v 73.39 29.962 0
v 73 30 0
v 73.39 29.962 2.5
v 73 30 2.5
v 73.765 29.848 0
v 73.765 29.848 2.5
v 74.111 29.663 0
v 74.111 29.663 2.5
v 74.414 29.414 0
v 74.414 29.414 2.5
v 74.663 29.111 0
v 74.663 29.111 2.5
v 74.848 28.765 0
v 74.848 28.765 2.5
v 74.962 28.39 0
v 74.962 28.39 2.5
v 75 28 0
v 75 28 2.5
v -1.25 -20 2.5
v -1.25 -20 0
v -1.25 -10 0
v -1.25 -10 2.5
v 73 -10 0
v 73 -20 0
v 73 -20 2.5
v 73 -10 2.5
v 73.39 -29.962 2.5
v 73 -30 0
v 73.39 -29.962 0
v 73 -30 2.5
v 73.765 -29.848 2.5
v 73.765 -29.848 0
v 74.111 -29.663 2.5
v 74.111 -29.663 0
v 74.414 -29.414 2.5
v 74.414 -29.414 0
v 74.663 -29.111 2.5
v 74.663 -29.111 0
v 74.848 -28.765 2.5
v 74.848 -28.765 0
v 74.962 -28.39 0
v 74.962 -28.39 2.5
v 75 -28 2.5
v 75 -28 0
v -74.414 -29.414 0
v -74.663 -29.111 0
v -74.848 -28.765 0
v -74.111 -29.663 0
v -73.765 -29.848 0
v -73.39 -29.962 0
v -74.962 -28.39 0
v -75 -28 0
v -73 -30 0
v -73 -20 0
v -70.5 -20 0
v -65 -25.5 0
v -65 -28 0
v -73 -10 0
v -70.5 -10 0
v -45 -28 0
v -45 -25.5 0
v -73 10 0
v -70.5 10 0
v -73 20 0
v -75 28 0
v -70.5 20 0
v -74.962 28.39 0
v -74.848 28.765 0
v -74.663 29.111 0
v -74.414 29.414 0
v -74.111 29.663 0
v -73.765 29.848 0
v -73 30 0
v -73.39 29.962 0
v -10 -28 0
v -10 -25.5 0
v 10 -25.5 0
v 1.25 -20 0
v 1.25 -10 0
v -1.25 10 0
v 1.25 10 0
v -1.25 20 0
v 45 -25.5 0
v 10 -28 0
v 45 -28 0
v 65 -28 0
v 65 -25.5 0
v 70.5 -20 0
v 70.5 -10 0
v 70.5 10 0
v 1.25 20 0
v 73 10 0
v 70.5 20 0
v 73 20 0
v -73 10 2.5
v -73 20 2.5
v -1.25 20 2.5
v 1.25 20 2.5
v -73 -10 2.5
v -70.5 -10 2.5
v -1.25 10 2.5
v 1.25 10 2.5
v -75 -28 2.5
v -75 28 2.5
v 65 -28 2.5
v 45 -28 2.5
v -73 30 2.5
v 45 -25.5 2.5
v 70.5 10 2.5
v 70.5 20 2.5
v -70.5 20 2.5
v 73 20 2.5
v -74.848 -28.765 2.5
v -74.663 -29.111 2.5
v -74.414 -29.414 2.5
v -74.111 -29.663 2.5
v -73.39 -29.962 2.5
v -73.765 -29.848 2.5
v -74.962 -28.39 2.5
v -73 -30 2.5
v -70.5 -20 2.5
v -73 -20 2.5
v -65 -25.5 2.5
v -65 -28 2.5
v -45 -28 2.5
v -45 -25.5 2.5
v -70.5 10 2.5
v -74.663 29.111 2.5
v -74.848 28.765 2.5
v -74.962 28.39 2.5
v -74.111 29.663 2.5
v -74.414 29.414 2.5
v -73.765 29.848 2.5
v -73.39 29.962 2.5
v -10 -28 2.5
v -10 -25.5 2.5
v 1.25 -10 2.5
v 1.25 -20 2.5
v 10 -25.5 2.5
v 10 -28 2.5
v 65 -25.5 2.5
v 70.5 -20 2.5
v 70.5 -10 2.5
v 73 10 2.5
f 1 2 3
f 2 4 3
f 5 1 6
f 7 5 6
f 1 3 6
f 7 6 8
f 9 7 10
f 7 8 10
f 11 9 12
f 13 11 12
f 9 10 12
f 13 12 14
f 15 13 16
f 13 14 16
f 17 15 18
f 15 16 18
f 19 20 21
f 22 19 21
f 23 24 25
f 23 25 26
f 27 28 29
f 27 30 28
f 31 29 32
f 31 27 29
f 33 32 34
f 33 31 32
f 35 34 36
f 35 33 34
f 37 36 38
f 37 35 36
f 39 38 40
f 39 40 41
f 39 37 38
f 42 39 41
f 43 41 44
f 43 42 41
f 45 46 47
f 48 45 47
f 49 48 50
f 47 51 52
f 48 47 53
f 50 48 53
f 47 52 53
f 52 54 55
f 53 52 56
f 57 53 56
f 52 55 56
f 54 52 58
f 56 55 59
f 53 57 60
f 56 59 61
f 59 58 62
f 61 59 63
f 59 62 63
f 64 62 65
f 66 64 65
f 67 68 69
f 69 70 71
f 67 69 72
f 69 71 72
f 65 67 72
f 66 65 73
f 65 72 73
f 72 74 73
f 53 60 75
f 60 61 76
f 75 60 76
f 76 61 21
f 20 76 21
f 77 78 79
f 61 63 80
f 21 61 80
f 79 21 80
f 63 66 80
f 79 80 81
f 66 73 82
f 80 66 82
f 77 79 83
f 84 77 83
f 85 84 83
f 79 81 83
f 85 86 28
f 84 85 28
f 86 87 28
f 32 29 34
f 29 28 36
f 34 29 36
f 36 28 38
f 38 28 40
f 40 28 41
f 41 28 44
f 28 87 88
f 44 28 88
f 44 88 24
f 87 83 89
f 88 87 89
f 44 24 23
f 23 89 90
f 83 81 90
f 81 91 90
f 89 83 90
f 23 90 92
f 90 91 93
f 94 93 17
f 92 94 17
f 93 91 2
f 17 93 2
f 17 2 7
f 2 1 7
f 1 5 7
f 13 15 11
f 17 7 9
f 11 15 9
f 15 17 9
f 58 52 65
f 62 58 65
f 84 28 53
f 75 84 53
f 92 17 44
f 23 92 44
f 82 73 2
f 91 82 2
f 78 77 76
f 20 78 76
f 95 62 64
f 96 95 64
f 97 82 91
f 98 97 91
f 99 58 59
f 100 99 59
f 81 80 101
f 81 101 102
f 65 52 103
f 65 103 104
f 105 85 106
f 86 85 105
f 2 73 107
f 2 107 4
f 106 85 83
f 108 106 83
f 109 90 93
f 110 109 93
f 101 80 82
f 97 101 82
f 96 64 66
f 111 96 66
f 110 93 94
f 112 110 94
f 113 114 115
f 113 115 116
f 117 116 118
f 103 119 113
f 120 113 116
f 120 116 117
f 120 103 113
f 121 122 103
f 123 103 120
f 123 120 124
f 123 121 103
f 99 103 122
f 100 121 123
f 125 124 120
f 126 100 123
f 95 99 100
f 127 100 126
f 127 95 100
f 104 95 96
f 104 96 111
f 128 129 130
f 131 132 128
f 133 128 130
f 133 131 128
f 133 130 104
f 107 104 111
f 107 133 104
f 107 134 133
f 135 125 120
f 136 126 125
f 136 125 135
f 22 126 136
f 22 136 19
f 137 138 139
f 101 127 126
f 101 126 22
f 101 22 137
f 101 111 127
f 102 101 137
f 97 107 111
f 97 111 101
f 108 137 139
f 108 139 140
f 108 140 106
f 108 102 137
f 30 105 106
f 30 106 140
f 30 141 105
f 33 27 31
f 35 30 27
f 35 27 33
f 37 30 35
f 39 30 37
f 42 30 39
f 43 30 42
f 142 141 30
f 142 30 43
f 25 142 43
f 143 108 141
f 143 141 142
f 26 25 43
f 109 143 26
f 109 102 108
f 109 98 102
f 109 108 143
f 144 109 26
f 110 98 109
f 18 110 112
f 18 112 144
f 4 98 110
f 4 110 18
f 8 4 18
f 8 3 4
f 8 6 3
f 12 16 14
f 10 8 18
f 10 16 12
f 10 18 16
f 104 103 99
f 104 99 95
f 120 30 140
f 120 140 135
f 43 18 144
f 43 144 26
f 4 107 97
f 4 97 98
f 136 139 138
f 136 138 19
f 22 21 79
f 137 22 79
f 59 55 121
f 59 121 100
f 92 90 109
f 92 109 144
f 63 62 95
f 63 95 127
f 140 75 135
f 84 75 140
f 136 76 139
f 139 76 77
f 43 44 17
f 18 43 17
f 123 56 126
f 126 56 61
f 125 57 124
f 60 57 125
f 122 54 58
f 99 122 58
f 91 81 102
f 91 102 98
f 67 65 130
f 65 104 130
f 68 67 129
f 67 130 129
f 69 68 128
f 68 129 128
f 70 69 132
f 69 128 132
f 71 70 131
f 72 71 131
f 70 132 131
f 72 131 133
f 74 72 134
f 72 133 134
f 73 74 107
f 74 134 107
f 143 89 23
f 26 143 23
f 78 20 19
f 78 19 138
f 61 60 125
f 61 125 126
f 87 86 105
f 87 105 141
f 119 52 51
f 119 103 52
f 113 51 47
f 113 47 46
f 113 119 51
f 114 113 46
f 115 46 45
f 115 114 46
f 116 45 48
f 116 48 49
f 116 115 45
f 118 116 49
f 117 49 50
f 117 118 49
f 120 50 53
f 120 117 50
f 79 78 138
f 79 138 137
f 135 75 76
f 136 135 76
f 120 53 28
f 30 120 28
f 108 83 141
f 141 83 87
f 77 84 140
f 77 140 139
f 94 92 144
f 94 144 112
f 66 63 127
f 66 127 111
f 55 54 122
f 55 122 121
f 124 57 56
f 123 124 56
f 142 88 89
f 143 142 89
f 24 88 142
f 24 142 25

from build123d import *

# Parameters (mm, degrees)
SKETCH1_W           = 150
SKETCH1_H           = 60
SKETCH1_W_2         = 2.5
SKETCH1_H_2         = 10
SKETCH1_W_3         = 20
SKETCH1_H_3         = 2.5
BOSS_EXTRUDE1_DEPTH = 2.5
FILLET2_R           = 2


with BuildPart() as part:
    # Sketch1 → Boss-Extrude1 (new body)
    with BuildSketch(Plane.XY):
        Rectangle(SKETCH1_W, SKETCH1_H)
        with Locations((-71.75, -15)):
            Rectangle(SKETCH1_W_2, SKETCH1_H_2, mode=Mode.SUBTRACT)
        with Locations((-71.75, 15)):
            Rectangle(SKETCH1_W_2, SKETCH1_H_2, mode=Mode.SUBTRACT)
        with Locations((0, 15)):
            Rectangle(SKETCH1_W_2, SKETCH1_H_2, mode=Mode.SUBTRACT)
        with Locations((0, -15)):
            Rectangle(SKETCH1_W_2, SKETCH1_H_2, mode=Mode.SUBTRACT)
        with Locations((71.75, 15)):
            Rectangle(SKETCH1_W_2, SKETCH1_H_2, mode=Mode.SUBTRACT)
        with Locations((71.75, -15)):
            Rectangle(SKETCH1_W_2, SKETCH1_H_2, mode=Mode.SUBTRACT)
        with Locations((0, -26.75)):
            Rectangle(SKETCH1_W_3, SKETCH1_H_3, mode=Mode.SUBTRACT)
        with Locations((-55, -26.75)):
            Rectangle(SKETCH1_W_3, SKETCH1_H_3, mode=Mode.SUBTRACT)
        with Locations((55, -26.75)):
            Rectangle(SKETCH1_W_3, SKETCH1_H_3, mode=Mode.SUBTRACT)
    extrude(amount=BOSS_EXTRUDE1_DEPTH)

    # Fillet2
    fillet2_edges = [part.edges().sort_by_distance(p)[0] for p in [
        (75, -30, 1.25),
        (-75, -30, 1.25),
        (-75, 30, 1.25),
        (75, 30, 1.25),
    ]]
    fillet(fillet2_edges, radius=FILLET2_R)


solid = part.part
